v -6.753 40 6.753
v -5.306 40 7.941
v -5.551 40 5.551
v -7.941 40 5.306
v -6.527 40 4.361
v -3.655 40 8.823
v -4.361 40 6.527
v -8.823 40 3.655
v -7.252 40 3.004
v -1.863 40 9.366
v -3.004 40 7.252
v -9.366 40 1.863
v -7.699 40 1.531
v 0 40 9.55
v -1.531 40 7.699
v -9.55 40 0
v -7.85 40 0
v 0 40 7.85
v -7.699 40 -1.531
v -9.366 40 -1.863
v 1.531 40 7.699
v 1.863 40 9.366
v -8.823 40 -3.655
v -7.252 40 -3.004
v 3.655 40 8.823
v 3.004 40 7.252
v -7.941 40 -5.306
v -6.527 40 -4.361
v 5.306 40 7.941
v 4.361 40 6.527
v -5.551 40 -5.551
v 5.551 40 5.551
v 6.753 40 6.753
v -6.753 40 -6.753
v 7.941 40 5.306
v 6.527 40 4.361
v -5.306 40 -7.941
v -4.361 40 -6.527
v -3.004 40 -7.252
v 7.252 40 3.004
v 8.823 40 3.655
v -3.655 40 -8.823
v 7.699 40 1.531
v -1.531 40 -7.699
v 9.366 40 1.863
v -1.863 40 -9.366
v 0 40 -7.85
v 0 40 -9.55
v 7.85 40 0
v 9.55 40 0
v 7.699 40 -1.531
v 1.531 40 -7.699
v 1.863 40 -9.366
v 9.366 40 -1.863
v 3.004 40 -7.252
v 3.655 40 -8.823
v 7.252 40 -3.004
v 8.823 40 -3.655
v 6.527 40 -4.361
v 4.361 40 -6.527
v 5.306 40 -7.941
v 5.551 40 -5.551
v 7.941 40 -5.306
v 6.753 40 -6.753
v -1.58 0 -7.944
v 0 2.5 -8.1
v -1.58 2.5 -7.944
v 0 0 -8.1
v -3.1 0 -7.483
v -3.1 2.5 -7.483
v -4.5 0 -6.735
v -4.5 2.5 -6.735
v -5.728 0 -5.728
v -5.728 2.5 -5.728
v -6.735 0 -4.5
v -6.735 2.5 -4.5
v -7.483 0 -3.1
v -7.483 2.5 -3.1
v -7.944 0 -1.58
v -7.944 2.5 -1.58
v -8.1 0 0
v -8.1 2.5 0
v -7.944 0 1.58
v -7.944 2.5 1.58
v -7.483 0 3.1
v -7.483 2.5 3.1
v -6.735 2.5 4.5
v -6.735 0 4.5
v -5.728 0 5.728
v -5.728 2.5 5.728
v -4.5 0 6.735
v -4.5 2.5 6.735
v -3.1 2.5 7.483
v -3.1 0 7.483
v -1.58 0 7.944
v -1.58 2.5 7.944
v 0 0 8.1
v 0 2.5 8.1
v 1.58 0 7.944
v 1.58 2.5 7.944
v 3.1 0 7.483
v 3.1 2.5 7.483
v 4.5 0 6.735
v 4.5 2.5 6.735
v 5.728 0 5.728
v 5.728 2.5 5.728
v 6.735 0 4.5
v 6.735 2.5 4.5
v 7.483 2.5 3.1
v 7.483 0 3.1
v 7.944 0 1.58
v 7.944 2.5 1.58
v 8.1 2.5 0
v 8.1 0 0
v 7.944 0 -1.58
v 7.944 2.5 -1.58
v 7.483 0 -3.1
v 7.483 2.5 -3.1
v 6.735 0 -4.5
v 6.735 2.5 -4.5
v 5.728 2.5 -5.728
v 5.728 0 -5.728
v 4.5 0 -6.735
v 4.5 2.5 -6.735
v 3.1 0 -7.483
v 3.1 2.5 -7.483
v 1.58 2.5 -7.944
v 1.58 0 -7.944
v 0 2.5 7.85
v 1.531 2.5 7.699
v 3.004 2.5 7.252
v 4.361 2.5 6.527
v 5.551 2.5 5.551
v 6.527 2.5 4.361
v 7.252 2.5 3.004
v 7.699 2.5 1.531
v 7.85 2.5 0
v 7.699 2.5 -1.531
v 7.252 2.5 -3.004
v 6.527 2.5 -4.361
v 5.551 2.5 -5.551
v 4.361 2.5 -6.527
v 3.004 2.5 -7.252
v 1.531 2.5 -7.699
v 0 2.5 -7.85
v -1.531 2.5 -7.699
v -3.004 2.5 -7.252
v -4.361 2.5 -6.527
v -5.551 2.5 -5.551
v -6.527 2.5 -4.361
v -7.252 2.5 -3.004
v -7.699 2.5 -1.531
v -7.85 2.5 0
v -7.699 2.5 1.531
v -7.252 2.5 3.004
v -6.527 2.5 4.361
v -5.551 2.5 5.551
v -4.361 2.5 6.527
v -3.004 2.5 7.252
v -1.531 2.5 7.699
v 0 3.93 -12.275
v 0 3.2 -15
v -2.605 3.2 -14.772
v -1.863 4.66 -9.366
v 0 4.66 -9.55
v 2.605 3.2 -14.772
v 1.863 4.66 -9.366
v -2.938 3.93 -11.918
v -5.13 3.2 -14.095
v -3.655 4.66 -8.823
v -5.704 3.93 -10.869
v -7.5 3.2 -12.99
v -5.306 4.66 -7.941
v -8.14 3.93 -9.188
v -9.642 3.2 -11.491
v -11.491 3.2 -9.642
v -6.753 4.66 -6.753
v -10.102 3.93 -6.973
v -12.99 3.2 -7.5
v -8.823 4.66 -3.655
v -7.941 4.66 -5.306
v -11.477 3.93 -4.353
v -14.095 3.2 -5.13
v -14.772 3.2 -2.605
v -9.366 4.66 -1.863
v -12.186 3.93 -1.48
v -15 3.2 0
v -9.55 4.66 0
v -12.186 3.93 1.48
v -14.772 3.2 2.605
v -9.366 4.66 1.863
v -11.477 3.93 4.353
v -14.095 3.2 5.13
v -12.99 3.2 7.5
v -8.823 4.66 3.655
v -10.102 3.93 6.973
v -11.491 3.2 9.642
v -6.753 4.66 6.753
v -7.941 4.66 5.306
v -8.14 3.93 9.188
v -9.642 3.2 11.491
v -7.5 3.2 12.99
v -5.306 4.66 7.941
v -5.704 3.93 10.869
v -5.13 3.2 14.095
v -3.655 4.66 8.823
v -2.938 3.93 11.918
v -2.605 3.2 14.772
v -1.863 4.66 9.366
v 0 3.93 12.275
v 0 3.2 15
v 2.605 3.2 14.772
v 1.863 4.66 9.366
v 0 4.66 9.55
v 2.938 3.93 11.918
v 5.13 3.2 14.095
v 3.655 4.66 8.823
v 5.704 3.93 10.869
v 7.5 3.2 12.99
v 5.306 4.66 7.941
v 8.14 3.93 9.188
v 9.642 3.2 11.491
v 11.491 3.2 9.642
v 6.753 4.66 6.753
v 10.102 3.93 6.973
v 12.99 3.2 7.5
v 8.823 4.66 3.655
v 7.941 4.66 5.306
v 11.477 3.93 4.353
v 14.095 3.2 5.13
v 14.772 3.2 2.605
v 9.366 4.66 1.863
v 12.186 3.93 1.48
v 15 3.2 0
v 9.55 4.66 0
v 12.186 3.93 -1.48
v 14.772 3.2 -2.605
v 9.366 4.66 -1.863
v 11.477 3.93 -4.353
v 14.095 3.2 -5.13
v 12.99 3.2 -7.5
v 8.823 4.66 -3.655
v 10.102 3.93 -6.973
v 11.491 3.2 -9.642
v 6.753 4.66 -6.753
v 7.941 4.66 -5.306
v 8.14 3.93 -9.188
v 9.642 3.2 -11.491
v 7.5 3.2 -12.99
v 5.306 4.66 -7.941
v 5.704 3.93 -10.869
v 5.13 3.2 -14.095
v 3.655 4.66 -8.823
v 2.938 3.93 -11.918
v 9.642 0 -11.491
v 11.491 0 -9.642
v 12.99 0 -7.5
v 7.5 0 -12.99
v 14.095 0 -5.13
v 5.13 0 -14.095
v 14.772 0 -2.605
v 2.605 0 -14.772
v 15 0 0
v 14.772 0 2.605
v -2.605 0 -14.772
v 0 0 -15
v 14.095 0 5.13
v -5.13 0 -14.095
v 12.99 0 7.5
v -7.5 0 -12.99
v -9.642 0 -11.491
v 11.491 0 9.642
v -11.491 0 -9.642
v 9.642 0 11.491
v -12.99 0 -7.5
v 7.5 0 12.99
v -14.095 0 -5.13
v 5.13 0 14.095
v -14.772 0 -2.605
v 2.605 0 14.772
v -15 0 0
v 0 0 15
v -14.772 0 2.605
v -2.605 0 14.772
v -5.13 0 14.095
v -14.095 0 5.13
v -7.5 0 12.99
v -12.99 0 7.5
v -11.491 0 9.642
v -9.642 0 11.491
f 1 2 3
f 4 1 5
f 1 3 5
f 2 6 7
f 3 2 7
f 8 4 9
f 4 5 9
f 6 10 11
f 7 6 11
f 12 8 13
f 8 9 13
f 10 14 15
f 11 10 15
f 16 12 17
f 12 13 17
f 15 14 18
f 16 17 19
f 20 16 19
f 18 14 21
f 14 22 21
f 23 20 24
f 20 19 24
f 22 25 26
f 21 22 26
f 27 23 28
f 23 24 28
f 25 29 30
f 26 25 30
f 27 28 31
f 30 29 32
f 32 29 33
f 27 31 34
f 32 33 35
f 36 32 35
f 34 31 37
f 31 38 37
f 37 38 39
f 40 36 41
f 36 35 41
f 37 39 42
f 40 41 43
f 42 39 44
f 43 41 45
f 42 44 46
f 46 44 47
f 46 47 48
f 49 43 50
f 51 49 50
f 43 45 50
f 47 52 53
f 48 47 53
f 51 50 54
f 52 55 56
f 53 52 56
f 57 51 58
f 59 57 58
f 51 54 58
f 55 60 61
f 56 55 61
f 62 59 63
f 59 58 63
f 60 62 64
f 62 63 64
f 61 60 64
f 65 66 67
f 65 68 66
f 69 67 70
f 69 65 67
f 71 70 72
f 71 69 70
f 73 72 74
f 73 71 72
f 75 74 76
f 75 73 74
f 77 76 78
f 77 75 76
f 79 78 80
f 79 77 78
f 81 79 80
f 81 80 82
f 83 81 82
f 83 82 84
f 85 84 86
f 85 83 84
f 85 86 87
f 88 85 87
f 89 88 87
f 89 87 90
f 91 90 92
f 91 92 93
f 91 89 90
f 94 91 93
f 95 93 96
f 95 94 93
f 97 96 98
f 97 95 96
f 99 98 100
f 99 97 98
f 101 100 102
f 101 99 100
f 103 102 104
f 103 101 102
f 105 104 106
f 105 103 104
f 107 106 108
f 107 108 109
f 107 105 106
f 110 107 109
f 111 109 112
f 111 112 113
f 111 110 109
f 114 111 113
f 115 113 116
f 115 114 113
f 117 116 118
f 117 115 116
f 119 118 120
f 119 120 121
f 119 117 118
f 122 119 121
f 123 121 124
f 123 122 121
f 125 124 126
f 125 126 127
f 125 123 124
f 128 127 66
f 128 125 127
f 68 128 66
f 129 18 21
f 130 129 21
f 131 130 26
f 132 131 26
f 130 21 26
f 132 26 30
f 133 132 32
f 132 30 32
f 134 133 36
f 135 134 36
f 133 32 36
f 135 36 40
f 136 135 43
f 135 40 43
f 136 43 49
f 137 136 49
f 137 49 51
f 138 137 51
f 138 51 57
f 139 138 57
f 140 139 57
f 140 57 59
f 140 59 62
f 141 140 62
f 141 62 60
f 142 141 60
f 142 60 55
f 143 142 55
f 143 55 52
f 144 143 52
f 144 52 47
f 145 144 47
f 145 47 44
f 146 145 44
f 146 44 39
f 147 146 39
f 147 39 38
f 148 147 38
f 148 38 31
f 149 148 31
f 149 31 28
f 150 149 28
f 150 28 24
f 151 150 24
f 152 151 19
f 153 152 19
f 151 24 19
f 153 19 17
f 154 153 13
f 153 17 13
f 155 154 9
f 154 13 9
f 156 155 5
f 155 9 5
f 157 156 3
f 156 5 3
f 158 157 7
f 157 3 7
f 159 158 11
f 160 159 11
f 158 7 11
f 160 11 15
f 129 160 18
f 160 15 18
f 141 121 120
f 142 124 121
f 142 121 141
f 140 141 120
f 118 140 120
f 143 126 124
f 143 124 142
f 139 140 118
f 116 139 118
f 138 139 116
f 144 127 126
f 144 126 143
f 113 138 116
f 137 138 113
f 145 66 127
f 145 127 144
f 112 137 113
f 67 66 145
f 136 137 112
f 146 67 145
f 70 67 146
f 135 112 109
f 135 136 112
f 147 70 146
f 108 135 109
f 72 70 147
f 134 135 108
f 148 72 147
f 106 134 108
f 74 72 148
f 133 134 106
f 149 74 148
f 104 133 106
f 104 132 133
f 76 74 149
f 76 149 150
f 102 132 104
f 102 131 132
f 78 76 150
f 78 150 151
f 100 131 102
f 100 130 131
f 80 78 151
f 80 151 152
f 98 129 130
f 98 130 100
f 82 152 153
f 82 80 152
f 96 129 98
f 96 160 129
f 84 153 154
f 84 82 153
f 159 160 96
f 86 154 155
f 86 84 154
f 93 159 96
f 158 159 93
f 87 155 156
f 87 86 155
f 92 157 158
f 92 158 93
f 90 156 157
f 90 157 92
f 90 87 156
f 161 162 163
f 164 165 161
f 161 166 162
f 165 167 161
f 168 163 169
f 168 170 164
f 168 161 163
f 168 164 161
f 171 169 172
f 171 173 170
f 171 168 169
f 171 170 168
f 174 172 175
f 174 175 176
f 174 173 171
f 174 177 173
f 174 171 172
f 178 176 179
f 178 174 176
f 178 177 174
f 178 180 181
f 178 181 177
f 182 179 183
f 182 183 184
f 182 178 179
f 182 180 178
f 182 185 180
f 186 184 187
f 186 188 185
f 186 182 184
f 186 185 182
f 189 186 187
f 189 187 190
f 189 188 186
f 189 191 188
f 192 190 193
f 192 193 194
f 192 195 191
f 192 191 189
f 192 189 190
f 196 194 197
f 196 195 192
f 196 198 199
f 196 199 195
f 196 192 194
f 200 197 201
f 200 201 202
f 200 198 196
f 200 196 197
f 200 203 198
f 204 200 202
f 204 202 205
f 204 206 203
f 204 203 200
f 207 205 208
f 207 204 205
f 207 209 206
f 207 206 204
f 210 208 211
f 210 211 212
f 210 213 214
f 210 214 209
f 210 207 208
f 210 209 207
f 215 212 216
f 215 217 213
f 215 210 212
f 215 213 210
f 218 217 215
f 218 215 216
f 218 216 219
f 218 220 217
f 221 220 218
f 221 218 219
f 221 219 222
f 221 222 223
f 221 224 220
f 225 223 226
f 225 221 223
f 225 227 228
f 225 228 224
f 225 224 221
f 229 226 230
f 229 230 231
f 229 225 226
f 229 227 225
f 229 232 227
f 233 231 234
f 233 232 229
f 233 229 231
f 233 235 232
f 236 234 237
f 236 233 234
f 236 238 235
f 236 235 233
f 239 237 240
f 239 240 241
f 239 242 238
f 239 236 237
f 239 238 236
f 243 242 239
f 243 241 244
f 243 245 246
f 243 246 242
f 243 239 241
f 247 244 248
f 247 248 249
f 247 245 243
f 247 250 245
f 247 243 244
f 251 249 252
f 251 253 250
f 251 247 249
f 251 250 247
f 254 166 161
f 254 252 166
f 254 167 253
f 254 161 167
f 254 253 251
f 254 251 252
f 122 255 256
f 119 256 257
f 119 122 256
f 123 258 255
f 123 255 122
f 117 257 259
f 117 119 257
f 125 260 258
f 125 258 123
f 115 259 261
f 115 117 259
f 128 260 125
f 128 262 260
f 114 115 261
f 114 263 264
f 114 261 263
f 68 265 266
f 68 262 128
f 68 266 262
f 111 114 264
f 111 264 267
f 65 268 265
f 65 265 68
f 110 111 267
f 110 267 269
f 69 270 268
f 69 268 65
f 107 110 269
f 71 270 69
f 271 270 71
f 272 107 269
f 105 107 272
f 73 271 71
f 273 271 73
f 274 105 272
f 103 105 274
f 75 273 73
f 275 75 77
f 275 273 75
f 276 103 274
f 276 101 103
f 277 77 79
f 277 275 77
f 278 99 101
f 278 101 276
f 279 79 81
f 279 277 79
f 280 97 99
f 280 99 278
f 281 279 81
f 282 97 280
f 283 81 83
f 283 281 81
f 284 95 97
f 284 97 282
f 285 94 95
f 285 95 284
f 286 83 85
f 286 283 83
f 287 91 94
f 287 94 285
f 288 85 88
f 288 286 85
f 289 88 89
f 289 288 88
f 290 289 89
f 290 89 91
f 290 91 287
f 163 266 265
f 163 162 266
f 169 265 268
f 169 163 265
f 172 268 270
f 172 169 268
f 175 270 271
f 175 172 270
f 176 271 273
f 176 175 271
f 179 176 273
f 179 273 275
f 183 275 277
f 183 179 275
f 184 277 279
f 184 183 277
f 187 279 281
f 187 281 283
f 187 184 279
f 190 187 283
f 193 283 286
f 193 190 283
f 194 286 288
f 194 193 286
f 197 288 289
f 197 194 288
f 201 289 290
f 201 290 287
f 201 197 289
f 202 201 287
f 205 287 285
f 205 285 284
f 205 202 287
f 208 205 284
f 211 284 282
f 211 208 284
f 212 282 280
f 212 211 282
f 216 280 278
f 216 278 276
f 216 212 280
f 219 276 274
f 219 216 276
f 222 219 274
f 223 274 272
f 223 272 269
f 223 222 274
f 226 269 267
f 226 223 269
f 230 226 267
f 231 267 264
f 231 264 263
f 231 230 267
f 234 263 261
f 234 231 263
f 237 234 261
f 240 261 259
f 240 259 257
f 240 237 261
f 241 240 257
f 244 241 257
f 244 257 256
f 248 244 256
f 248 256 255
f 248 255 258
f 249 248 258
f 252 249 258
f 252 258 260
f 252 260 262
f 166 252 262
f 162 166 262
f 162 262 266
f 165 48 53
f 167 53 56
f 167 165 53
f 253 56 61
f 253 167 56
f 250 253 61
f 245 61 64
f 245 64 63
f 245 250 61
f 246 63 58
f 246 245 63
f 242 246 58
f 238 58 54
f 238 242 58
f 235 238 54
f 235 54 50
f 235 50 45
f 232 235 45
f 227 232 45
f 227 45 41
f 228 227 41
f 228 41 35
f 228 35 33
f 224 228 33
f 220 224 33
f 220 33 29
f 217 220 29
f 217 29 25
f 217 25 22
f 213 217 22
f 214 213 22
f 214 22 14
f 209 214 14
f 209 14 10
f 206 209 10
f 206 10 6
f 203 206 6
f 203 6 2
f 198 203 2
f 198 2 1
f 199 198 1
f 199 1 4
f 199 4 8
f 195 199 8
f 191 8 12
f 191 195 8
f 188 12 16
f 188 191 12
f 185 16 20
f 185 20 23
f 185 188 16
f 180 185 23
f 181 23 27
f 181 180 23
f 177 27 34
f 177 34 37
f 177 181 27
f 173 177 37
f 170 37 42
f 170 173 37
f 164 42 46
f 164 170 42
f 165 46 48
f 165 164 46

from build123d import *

# Parameters (mm, degrees)
SKETCH5_R     = 9.55
STUB_DEPTH    = 37.5
BORE_SKETCH_R = 7.85
BORE_DEPTH    = 46.276925691


with BuildPart() as part:
    # Sketch1 → Flange (revolve)
    with BuildSketch(Plane(origin=(0, 0, 0), x_dir=(0, 0, -1), z_dir=(1, 0, 0)), mode=Mode.PRIVATE) as flange_sk:
        Polygon((-15, 0), (-15, 3.2), (-6.789488223, 5.4), (0, 5.4), (0, 2.5), (-8.1, 2.5), (-8.1, 0), align=None)
    revolve(flange_sk.sketch.rotate(Axis((0, 0, 0), (0, 1, 0)), 180), axis=Axis((0, 0, 0), (0, 1, 0)))

    # Sketch5 → Stub (add)
    with BuildSketch(Plane.XZ.offset(-2.5)):
        with Locations(Location((0, 0, 0), (0, 0, 270))):
            Circle(SKETCH5_R)
    extrude(amount=-STUB_DEPTH)

    # Bore Sketch → Bore (cut, through all)
    with BuildSketch(Plane(origin=(0, 40, 0), x_dir=(1, 0, 0), z_dir=(0, 1, 0))):
        with Locations(Location((0, 0, 0), (0, 0, 270))):
            Circle(BORE_SKETCH_R)
    extrude(amount=-BORE_DEPTH, mode=Mode.SUBTRACT)


solid = part.part
